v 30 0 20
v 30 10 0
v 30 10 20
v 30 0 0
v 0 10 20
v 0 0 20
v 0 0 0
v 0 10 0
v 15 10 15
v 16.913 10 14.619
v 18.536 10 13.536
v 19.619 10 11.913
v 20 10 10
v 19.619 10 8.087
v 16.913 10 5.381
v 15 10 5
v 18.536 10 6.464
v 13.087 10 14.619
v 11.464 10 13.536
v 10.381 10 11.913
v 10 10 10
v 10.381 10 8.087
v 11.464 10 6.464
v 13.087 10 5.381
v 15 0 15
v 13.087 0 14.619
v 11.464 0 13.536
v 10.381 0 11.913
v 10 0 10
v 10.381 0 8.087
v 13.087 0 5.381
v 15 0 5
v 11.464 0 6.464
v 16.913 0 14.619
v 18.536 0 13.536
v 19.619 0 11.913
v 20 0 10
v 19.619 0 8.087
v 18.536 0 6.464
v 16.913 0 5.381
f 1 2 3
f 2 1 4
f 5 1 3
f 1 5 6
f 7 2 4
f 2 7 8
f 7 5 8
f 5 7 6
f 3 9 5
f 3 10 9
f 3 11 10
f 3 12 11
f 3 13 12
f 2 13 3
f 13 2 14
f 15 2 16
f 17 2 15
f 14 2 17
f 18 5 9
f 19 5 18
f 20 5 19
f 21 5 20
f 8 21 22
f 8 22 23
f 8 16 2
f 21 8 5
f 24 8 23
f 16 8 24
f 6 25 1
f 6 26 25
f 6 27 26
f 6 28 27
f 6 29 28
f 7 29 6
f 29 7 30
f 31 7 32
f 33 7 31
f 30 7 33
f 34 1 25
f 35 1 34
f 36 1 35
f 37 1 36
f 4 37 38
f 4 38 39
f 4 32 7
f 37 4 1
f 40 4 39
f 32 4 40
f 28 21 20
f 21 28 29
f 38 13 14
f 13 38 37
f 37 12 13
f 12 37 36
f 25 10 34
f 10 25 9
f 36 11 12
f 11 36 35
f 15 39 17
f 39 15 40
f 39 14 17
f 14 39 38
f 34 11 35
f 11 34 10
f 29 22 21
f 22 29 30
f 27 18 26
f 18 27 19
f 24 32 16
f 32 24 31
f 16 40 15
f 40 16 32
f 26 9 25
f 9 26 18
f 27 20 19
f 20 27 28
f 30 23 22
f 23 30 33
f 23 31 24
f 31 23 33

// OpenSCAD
Mount_Base = 30;
Mount_Thickness = 10;
Mount_Height = 20;

difference() {

    cube([Mount_Base, Mount_Thickness, Mount_Height]);

    color("green")
    translate([Mount_Base/2, Mount_Thickness + 1, Mount_Thickness])
        rotate([90, 0, 0])
            cylinder(h = 12, d = 10);
        
}
